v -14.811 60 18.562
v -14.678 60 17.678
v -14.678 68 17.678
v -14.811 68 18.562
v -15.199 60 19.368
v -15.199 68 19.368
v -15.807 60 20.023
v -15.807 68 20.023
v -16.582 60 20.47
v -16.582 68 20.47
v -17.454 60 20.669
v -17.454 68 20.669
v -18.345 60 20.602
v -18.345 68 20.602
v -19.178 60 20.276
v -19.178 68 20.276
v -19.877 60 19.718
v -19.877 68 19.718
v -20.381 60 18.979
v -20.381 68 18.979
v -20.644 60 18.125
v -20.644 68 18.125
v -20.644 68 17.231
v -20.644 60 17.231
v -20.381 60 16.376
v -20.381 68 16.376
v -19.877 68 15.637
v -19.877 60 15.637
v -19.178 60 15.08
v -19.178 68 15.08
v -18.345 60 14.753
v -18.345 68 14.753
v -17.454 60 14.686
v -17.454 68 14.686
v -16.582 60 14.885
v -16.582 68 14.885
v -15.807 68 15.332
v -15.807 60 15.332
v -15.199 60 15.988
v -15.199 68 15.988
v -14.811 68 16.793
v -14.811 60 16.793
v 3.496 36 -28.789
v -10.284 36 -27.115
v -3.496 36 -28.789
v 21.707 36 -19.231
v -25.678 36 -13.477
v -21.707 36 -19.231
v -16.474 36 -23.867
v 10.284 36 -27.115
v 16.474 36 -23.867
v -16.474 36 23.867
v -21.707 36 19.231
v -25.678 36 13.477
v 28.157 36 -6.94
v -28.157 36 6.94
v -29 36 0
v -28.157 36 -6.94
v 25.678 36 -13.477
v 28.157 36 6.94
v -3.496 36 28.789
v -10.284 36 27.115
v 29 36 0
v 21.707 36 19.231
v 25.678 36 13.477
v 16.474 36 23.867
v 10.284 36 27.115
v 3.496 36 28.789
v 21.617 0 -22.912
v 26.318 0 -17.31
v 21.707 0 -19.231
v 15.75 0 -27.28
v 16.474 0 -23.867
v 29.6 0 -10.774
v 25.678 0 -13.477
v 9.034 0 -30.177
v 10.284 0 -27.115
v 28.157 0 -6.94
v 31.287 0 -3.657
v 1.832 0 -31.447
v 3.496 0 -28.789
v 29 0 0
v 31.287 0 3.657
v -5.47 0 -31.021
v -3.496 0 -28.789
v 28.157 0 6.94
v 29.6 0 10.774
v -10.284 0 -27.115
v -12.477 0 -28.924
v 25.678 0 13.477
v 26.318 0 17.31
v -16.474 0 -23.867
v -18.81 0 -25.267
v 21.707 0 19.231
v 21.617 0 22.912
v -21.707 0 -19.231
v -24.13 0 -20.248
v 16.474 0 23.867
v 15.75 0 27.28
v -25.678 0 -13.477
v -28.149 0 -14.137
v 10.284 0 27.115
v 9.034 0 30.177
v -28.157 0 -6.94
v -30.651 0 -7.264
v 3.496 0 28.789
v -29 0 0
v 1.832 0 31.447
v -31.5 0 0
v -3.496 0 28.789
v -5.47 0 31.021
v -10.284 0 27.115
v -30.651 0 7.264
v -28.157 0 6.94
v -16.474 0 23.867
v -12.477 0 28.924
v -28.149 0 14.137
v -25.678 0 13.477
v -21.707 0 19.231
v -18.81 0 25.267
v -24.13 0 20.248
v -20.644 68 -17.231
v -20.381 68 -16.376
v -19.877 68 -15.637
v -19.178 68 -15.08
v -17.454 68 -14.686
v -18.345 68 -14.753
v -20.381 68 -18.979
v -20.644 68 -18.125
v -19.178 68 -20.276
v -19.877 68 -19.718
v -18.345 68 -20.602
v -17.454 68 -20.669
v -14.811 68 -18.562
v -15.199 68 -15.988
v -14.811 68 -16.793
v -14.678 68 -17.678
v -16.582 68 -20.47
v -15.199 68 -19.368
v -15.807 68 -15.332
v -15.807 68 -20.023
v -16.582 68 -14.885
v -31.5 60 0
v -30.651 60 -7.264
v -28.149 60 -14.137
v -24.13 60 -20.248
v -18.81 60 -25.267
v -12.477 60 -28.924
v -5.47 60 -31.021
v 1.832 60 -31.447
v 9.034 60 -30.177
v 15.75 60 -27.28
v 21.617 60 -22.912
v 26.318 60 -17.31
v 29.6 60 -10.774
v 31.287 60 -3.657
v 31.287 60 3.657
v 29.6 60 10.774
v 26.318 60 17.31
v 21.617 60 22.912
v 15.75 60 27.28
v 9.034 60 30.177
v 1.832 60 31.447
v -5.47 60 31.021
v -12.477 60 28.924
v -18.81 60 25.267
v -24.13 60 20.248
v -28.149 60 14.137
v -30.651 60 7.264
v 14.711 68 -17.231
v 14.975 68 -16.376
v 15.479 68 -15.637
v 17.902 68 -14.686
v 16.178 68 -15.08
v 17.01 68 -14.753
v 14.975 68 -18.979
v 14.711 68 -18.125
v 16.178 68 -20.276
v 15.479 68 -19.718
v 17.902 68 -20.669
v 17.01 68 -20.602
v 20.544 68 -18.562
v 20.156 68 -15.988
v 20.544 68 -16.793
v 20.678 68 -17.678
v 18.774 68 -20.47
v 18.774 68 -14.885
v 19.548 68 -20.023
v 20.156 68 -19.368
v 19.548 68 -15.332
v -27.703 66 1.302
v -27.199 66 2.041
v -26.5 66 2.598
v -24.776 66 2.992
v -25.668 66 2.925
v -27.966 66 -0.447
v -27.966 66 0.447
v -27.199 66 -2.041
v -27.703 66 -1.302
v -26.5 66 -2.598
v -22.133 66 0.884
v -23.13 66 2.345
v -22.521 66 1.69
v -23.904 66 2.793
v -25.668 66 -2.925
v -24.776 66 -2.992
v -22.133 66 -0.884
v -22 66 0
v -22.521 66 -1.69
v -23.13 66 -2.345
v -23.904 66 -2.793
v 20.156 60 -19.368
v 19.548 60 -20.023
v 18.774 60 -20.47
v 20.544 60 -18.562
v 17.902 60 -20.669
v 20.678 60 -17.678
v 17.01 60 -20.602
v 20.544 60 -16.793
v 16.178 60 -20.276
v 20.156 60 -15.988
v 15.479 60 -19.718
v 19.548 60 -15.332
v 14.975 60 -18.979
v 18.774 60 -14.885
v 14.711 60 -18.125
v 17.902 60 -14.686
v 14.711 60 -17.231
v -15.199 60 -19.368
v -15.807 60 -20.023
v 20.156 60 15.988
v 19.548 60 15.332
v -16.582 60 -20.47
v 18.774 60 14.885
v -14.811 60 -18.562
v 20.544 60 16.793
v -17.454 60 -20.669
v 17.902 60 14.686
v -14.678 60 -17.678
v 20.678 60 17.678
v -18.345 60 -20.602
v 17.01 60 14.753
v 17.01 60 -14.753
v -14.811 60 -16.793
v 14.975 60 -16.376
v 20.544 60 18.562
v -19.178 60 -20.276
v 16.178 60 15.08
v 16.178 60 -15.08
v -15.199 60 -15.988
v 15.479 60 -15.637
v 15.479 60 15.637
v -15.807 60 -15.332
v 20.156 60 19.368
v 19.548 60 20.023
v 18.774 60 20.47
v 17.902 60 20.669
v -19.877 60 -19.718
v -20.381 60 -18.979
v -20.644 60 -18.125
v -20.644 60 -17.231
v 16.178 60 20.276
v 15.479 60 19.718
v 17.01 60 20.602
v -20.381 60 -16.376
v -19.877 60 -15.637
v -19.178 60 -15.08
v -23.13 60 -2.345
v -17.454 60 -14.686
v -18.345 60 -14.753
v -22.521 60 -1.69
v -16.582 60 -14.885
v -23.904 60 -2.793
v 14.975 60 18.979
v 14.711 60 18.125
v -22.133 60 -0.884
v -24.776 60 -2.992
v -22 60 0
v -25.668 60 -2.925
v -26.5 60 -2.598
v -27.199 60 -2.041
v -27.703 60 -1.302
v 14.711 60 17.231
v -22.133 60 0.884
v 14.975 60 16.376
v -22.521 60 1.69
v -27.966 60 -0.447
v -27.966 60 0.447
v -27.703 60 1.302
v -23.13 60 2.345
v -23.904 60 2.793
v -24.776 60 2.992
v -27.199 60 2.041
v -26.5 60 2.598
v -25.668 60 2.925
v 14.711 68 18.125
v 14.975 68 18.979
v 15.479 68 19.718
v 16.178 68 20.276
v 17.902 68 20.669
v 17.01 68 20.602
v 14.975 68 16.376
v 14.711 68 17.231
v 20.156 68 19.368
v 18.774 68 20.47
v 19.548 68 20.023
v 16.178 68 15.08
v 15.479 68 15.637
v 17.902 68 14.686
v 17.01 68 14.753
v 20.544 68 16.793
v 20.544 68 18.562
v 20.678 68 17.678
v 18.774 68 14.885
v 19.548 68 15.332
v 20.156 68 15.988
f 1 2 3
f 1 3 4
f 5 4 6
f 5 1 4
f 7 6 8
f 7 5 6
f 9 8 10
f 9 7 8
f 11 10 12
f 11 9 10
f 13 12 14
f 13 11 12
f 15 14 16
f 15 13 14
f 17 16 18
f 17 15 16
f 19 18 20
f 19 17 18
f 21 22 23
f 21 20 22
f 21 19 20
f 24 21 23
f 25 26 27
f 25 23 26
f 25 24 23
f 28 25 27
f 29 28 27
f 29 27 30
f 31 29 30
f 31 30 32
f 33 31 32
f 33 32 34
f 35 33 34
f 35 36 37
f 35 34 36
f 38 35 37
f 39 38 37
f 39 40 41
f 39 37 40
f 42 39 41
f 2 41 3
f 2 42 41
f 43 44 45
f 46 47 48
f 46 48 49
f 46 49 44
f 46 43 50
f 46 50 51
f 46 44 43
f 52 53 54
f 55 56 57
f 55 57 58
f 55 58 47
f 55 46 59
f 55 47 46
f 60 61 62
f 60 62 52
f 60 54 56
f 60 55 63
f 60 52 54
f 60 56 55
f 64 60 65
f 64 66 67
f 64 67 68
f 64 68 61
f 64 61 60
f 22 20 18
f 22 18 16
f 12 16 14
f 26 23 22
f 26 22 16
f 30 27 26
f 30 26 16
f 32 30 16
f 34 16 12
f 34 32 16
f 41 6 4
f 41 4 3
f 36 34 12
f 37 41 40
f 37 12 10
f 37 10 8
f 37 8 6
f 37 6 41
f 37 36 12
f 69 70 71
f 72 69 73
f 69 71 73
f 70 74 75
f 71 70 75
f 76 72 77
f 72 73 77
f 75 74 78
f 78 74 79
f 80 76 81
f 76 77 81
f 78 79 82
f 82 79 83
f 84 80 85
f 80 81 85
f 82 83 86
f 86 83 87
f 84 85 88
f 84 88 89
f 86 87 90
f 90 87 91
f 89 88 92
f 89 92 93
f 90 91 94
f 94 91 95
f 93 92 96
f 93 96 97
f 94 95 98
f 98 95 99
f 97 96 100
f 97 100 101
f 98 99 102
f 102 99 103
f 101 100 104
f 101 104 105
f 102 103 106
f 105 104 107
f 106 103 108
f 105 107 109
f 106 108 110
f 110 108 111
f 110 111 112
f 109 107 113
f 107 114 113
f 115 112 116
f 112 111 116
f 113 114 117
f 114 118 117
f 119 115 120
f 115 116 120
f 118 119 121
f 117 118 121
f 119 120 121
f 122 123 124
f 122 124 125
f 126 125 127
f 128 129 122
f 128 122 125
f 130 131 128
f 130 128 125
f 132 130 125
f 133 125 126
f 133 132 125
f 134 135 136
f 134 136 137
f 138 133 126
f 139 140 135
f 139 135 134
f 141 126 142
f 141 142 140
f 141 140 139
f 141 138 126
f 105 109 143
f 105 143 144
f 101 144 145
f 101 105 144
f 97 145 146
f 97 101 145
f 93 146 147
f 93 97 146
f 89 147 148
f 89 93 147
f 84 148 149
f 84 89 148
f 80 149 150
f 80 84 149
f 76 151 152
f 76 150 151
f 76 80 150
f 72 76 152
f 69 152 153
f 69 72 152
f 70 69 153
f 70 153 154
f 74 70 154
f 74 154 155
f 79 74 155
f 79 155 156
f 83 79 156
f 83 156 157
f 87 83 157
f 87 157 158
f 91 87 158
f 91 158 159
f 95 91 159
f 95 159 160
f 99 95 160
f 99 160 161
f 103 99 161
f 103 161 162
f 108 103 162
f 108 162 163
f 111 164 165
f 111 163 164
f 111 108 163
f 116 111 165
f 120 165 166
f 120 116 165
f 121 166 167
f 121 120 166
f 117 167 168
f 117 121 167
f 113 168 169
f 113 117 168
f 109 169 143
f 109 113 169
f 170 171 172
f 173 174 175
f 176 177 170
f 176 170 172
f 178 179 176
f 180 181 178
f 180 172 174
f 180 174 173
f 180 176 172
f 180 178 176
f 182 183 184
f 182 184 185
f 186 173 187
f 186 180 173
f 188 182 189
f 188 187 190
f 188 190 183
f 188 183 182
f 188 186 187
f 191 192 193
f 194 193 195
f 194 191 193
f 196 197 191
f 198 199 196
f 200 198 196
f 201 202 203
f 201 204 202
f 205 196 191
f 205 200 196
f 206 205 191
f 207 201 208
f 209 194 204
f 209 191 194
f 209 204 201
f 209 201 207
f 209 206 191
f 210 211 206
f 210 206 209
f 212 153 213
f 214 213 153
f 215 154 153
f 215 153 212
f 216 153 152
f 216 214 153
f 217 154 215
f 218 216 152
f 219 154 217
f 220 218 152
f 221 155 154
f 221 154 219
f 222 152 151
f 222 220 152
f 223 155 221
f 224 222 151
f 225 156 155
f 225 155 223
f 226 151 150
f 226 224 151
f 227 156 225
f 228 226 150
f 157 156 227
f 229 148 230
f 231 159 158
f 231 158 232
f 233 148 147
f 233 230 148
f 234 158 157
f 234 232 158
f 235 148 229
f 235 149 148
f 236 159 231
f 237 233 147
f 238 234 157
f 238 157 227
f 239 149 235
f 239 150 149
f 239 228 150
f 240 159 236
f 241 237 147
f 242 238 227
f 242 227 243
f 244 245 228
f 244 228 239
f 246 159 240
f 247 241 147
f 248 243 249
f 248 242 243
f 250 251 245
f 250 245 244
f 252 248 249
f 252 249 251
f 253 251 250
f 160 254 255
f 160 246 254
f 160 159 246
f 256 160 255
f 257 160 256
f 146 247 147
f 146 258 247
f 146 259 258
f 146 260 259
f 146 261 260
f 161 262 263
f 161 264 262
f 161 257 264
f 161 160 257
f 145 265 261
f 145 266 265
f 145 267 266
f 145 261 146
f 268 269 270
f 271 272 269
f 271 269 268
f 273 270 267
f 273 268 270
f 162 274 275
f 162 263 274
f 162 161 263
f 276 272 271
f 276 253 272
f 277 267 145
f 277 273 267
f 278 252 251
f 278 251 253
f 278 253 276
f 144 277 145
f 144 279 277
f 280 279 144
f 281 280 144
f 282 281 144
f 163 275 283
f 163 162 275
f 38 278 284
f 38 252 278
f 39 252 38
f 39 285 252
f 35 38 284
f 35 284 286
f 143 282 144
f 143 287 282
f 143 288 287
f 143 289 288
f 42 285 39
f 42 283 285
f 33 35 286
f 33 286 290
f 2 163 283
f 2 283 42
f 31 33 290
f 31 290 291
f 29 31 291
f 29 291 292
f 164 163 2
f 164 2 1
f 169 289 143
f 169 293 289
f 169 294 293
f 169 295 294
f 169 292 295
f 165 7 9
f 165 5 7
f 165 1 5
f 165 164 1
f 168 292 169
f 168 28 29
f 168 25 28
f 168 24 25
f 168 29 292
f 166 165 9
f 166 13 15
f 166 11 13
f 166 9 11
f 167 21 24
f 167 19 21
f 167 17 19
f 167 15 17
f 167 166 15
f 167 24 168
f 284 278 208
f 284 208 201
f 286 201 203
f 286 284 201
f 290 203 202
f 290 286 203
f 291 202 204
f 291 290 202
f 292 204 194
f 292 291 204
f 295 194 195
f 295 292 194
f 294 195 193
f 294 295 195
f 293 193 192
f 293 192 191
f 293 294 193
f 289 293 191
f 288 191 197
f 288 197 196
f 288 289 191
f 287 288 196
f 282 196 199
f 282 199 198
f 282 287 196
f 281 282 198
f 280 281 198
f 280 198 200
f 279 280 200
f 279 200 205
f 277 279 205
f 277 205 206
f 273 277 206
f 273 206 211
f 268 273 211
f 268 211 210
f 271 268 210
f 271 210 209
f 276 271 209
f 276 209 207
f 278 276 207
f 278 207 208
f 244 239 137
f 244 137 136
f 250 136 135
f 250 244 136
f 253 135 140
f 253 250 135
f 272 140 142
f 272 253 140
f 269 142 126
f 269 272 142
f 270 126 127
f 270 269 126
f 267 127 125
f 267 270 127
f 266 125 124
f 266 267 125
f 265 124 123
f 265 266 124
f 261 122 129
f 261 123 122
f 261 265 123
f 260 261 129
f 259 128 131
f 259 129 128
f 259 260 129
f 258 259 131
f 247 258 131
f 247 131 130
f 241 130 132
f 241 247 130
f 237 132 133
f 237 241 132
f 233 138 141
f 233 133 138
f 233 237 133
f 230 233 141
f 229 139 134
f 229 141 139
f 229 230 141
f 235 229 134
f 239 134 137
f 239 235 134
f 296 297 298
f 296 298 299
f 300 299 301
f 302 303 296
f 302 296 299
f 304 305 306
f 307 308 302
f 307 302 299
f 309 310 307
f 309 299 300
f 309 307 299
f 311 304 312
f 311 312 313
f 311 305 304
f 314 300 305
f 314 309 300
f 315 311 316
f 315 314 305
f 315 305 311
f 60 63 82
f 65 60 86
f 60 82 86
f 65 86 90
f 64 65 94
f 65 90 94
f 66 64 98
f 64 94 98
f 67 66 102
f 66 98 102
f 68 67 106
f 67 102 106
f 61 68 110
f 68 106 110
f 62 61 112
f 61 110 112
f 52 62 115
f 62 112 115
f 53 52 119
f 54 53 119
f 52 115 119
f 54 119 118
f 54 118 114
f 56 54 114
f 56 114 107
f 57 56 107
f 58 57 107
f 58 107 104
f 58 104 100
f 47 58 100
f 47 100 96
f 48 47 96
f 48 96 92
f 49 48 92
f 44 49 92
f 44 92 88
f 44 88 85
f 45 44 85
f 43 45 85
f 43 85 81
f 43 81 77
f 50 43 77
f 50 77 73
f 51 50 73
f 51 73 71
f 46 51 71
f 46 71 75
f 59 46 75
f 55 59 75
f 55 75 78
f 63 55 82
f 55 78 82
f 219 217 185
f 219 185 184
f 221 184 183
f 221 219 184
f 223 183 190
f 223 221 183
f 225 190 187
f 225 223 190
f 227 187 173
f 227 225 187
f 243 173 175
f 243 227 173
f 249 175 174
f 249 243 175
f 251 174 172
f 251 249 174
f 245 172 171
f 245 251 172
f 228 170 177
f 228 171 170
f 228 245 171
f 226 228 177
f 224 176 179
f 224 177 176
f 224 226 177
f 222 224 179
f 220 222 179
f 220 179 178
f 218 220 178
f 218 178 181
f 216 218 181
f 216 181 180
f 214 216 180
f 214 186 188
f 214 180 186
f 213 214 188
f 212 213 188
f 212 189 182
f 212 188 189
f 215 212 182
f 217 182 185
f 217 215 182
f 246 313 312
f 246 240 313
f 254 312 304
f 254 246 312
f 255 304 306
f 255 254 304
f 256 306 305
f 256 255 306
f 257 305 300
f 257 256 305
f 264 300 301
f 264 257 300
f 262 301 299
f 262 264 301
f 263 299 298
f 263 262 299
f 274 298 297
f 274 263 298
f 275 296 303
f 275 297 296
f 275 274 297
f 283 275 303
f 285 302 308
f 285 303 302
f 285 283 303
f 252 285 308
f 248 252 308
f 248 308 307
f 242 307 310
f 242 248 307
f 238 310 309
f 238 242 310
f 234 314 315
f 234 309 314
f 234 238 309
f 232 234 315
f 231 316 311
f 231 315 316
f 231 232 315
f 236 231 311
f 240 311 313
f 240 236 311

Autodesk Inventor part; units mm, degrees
ref_plane "YZ Plane" through (0, 0, 0) normal (1, 0, 0) x (0, 1, 0)
ref_plane "XZ Plane" through (0, 0, 0) normal (0, 1, 0) x (-1, 0, 0)
ref_plane "XY Plane" through (0, 0, 0) normal (0, 0, 1) x (1, 0, 0)
sketch "Sketch4" plane through (0, 0, 0) normal (0, 1, 0) x (-1, 0, 0)
  circle A0 centre (0, 0) radius 31.5
  dimension "d7" = 63
extrude "Extrusion4" add sketch "Sketch4" along normal blind 60
sketch "Sketch6" plane through (0, 60, 0) normal (0, 1, 0) x (1, 0, 0)
  circle A0 centre (0, 0) radius 25
  circle A1 centre (-25, 0) radius 3
  dimension "d22" = 50
  dimension "d23" = 6
extrude "Extrusion6" add sketch "Sketch6" along normal blind 6 contours A1 A0 | A0 A1 picked at (-23.9867, 0) picked at (-25.9867, 0)
sketch "Sketch7" plane through (0, 60, 0) normal (0, 1, 0) x (1, 0, 0)
  line L0 (0, 0) -> (21.0028, 0) construction
  line L1 (0, 0) -> (25, 0) construction
  line L2 (0, 0) -> (25, 0) construction
  circle A0 centre (-17.6777, -17.6777) radius 3
  circle A1 centre (-17.6777, 17.6777) radius 3
  circle A2 centre (17.6777, 17.6777) radius 3
  circle A3 centre (17.6777, -17.6777) radius 3
  dimension "d34" = 6
  dimension "d35" = 6
  dimension "d36" = 6
  dimension "d37" = 6
extrude "Extrusion7" add sketch "Sketch7" along normal blind 8
thread "Thread1" size "M6x1" class "6g" standard "ISO Metric profile" full length
thread "Thread2" size "M6x1" class "6g" standard "ANSI Metric M Profile" full length
thread "Thread3" size "M6x1" class "6g" standard "ANSI Metric M Profile" full length
thread "Thread4" size "M6x1" class "6g" standard "ANSI Metric M Profile" full length
sketch "Sketch8" plane through (0, 0, 0) normal (0, -1, 0) x (1, 0, 0)
  circle A0 centre (0, 0) radius 29
extrude "Extrusion8" cut sketch "Sketch8" against normal blind 36
thread "Thread5" size "M58x4" class "6H" standard "ANSI Metric M Profile" full length
sketch "Sketch9" plane through (0, 36, 0) normal (0, -1, 0) x (1, 0, 0)
  point P0 (0, 0)
thread "Thread6" size "M58x3" class "6H" standard "ANSI Metric M Profile" full length
properties part number "platform"
